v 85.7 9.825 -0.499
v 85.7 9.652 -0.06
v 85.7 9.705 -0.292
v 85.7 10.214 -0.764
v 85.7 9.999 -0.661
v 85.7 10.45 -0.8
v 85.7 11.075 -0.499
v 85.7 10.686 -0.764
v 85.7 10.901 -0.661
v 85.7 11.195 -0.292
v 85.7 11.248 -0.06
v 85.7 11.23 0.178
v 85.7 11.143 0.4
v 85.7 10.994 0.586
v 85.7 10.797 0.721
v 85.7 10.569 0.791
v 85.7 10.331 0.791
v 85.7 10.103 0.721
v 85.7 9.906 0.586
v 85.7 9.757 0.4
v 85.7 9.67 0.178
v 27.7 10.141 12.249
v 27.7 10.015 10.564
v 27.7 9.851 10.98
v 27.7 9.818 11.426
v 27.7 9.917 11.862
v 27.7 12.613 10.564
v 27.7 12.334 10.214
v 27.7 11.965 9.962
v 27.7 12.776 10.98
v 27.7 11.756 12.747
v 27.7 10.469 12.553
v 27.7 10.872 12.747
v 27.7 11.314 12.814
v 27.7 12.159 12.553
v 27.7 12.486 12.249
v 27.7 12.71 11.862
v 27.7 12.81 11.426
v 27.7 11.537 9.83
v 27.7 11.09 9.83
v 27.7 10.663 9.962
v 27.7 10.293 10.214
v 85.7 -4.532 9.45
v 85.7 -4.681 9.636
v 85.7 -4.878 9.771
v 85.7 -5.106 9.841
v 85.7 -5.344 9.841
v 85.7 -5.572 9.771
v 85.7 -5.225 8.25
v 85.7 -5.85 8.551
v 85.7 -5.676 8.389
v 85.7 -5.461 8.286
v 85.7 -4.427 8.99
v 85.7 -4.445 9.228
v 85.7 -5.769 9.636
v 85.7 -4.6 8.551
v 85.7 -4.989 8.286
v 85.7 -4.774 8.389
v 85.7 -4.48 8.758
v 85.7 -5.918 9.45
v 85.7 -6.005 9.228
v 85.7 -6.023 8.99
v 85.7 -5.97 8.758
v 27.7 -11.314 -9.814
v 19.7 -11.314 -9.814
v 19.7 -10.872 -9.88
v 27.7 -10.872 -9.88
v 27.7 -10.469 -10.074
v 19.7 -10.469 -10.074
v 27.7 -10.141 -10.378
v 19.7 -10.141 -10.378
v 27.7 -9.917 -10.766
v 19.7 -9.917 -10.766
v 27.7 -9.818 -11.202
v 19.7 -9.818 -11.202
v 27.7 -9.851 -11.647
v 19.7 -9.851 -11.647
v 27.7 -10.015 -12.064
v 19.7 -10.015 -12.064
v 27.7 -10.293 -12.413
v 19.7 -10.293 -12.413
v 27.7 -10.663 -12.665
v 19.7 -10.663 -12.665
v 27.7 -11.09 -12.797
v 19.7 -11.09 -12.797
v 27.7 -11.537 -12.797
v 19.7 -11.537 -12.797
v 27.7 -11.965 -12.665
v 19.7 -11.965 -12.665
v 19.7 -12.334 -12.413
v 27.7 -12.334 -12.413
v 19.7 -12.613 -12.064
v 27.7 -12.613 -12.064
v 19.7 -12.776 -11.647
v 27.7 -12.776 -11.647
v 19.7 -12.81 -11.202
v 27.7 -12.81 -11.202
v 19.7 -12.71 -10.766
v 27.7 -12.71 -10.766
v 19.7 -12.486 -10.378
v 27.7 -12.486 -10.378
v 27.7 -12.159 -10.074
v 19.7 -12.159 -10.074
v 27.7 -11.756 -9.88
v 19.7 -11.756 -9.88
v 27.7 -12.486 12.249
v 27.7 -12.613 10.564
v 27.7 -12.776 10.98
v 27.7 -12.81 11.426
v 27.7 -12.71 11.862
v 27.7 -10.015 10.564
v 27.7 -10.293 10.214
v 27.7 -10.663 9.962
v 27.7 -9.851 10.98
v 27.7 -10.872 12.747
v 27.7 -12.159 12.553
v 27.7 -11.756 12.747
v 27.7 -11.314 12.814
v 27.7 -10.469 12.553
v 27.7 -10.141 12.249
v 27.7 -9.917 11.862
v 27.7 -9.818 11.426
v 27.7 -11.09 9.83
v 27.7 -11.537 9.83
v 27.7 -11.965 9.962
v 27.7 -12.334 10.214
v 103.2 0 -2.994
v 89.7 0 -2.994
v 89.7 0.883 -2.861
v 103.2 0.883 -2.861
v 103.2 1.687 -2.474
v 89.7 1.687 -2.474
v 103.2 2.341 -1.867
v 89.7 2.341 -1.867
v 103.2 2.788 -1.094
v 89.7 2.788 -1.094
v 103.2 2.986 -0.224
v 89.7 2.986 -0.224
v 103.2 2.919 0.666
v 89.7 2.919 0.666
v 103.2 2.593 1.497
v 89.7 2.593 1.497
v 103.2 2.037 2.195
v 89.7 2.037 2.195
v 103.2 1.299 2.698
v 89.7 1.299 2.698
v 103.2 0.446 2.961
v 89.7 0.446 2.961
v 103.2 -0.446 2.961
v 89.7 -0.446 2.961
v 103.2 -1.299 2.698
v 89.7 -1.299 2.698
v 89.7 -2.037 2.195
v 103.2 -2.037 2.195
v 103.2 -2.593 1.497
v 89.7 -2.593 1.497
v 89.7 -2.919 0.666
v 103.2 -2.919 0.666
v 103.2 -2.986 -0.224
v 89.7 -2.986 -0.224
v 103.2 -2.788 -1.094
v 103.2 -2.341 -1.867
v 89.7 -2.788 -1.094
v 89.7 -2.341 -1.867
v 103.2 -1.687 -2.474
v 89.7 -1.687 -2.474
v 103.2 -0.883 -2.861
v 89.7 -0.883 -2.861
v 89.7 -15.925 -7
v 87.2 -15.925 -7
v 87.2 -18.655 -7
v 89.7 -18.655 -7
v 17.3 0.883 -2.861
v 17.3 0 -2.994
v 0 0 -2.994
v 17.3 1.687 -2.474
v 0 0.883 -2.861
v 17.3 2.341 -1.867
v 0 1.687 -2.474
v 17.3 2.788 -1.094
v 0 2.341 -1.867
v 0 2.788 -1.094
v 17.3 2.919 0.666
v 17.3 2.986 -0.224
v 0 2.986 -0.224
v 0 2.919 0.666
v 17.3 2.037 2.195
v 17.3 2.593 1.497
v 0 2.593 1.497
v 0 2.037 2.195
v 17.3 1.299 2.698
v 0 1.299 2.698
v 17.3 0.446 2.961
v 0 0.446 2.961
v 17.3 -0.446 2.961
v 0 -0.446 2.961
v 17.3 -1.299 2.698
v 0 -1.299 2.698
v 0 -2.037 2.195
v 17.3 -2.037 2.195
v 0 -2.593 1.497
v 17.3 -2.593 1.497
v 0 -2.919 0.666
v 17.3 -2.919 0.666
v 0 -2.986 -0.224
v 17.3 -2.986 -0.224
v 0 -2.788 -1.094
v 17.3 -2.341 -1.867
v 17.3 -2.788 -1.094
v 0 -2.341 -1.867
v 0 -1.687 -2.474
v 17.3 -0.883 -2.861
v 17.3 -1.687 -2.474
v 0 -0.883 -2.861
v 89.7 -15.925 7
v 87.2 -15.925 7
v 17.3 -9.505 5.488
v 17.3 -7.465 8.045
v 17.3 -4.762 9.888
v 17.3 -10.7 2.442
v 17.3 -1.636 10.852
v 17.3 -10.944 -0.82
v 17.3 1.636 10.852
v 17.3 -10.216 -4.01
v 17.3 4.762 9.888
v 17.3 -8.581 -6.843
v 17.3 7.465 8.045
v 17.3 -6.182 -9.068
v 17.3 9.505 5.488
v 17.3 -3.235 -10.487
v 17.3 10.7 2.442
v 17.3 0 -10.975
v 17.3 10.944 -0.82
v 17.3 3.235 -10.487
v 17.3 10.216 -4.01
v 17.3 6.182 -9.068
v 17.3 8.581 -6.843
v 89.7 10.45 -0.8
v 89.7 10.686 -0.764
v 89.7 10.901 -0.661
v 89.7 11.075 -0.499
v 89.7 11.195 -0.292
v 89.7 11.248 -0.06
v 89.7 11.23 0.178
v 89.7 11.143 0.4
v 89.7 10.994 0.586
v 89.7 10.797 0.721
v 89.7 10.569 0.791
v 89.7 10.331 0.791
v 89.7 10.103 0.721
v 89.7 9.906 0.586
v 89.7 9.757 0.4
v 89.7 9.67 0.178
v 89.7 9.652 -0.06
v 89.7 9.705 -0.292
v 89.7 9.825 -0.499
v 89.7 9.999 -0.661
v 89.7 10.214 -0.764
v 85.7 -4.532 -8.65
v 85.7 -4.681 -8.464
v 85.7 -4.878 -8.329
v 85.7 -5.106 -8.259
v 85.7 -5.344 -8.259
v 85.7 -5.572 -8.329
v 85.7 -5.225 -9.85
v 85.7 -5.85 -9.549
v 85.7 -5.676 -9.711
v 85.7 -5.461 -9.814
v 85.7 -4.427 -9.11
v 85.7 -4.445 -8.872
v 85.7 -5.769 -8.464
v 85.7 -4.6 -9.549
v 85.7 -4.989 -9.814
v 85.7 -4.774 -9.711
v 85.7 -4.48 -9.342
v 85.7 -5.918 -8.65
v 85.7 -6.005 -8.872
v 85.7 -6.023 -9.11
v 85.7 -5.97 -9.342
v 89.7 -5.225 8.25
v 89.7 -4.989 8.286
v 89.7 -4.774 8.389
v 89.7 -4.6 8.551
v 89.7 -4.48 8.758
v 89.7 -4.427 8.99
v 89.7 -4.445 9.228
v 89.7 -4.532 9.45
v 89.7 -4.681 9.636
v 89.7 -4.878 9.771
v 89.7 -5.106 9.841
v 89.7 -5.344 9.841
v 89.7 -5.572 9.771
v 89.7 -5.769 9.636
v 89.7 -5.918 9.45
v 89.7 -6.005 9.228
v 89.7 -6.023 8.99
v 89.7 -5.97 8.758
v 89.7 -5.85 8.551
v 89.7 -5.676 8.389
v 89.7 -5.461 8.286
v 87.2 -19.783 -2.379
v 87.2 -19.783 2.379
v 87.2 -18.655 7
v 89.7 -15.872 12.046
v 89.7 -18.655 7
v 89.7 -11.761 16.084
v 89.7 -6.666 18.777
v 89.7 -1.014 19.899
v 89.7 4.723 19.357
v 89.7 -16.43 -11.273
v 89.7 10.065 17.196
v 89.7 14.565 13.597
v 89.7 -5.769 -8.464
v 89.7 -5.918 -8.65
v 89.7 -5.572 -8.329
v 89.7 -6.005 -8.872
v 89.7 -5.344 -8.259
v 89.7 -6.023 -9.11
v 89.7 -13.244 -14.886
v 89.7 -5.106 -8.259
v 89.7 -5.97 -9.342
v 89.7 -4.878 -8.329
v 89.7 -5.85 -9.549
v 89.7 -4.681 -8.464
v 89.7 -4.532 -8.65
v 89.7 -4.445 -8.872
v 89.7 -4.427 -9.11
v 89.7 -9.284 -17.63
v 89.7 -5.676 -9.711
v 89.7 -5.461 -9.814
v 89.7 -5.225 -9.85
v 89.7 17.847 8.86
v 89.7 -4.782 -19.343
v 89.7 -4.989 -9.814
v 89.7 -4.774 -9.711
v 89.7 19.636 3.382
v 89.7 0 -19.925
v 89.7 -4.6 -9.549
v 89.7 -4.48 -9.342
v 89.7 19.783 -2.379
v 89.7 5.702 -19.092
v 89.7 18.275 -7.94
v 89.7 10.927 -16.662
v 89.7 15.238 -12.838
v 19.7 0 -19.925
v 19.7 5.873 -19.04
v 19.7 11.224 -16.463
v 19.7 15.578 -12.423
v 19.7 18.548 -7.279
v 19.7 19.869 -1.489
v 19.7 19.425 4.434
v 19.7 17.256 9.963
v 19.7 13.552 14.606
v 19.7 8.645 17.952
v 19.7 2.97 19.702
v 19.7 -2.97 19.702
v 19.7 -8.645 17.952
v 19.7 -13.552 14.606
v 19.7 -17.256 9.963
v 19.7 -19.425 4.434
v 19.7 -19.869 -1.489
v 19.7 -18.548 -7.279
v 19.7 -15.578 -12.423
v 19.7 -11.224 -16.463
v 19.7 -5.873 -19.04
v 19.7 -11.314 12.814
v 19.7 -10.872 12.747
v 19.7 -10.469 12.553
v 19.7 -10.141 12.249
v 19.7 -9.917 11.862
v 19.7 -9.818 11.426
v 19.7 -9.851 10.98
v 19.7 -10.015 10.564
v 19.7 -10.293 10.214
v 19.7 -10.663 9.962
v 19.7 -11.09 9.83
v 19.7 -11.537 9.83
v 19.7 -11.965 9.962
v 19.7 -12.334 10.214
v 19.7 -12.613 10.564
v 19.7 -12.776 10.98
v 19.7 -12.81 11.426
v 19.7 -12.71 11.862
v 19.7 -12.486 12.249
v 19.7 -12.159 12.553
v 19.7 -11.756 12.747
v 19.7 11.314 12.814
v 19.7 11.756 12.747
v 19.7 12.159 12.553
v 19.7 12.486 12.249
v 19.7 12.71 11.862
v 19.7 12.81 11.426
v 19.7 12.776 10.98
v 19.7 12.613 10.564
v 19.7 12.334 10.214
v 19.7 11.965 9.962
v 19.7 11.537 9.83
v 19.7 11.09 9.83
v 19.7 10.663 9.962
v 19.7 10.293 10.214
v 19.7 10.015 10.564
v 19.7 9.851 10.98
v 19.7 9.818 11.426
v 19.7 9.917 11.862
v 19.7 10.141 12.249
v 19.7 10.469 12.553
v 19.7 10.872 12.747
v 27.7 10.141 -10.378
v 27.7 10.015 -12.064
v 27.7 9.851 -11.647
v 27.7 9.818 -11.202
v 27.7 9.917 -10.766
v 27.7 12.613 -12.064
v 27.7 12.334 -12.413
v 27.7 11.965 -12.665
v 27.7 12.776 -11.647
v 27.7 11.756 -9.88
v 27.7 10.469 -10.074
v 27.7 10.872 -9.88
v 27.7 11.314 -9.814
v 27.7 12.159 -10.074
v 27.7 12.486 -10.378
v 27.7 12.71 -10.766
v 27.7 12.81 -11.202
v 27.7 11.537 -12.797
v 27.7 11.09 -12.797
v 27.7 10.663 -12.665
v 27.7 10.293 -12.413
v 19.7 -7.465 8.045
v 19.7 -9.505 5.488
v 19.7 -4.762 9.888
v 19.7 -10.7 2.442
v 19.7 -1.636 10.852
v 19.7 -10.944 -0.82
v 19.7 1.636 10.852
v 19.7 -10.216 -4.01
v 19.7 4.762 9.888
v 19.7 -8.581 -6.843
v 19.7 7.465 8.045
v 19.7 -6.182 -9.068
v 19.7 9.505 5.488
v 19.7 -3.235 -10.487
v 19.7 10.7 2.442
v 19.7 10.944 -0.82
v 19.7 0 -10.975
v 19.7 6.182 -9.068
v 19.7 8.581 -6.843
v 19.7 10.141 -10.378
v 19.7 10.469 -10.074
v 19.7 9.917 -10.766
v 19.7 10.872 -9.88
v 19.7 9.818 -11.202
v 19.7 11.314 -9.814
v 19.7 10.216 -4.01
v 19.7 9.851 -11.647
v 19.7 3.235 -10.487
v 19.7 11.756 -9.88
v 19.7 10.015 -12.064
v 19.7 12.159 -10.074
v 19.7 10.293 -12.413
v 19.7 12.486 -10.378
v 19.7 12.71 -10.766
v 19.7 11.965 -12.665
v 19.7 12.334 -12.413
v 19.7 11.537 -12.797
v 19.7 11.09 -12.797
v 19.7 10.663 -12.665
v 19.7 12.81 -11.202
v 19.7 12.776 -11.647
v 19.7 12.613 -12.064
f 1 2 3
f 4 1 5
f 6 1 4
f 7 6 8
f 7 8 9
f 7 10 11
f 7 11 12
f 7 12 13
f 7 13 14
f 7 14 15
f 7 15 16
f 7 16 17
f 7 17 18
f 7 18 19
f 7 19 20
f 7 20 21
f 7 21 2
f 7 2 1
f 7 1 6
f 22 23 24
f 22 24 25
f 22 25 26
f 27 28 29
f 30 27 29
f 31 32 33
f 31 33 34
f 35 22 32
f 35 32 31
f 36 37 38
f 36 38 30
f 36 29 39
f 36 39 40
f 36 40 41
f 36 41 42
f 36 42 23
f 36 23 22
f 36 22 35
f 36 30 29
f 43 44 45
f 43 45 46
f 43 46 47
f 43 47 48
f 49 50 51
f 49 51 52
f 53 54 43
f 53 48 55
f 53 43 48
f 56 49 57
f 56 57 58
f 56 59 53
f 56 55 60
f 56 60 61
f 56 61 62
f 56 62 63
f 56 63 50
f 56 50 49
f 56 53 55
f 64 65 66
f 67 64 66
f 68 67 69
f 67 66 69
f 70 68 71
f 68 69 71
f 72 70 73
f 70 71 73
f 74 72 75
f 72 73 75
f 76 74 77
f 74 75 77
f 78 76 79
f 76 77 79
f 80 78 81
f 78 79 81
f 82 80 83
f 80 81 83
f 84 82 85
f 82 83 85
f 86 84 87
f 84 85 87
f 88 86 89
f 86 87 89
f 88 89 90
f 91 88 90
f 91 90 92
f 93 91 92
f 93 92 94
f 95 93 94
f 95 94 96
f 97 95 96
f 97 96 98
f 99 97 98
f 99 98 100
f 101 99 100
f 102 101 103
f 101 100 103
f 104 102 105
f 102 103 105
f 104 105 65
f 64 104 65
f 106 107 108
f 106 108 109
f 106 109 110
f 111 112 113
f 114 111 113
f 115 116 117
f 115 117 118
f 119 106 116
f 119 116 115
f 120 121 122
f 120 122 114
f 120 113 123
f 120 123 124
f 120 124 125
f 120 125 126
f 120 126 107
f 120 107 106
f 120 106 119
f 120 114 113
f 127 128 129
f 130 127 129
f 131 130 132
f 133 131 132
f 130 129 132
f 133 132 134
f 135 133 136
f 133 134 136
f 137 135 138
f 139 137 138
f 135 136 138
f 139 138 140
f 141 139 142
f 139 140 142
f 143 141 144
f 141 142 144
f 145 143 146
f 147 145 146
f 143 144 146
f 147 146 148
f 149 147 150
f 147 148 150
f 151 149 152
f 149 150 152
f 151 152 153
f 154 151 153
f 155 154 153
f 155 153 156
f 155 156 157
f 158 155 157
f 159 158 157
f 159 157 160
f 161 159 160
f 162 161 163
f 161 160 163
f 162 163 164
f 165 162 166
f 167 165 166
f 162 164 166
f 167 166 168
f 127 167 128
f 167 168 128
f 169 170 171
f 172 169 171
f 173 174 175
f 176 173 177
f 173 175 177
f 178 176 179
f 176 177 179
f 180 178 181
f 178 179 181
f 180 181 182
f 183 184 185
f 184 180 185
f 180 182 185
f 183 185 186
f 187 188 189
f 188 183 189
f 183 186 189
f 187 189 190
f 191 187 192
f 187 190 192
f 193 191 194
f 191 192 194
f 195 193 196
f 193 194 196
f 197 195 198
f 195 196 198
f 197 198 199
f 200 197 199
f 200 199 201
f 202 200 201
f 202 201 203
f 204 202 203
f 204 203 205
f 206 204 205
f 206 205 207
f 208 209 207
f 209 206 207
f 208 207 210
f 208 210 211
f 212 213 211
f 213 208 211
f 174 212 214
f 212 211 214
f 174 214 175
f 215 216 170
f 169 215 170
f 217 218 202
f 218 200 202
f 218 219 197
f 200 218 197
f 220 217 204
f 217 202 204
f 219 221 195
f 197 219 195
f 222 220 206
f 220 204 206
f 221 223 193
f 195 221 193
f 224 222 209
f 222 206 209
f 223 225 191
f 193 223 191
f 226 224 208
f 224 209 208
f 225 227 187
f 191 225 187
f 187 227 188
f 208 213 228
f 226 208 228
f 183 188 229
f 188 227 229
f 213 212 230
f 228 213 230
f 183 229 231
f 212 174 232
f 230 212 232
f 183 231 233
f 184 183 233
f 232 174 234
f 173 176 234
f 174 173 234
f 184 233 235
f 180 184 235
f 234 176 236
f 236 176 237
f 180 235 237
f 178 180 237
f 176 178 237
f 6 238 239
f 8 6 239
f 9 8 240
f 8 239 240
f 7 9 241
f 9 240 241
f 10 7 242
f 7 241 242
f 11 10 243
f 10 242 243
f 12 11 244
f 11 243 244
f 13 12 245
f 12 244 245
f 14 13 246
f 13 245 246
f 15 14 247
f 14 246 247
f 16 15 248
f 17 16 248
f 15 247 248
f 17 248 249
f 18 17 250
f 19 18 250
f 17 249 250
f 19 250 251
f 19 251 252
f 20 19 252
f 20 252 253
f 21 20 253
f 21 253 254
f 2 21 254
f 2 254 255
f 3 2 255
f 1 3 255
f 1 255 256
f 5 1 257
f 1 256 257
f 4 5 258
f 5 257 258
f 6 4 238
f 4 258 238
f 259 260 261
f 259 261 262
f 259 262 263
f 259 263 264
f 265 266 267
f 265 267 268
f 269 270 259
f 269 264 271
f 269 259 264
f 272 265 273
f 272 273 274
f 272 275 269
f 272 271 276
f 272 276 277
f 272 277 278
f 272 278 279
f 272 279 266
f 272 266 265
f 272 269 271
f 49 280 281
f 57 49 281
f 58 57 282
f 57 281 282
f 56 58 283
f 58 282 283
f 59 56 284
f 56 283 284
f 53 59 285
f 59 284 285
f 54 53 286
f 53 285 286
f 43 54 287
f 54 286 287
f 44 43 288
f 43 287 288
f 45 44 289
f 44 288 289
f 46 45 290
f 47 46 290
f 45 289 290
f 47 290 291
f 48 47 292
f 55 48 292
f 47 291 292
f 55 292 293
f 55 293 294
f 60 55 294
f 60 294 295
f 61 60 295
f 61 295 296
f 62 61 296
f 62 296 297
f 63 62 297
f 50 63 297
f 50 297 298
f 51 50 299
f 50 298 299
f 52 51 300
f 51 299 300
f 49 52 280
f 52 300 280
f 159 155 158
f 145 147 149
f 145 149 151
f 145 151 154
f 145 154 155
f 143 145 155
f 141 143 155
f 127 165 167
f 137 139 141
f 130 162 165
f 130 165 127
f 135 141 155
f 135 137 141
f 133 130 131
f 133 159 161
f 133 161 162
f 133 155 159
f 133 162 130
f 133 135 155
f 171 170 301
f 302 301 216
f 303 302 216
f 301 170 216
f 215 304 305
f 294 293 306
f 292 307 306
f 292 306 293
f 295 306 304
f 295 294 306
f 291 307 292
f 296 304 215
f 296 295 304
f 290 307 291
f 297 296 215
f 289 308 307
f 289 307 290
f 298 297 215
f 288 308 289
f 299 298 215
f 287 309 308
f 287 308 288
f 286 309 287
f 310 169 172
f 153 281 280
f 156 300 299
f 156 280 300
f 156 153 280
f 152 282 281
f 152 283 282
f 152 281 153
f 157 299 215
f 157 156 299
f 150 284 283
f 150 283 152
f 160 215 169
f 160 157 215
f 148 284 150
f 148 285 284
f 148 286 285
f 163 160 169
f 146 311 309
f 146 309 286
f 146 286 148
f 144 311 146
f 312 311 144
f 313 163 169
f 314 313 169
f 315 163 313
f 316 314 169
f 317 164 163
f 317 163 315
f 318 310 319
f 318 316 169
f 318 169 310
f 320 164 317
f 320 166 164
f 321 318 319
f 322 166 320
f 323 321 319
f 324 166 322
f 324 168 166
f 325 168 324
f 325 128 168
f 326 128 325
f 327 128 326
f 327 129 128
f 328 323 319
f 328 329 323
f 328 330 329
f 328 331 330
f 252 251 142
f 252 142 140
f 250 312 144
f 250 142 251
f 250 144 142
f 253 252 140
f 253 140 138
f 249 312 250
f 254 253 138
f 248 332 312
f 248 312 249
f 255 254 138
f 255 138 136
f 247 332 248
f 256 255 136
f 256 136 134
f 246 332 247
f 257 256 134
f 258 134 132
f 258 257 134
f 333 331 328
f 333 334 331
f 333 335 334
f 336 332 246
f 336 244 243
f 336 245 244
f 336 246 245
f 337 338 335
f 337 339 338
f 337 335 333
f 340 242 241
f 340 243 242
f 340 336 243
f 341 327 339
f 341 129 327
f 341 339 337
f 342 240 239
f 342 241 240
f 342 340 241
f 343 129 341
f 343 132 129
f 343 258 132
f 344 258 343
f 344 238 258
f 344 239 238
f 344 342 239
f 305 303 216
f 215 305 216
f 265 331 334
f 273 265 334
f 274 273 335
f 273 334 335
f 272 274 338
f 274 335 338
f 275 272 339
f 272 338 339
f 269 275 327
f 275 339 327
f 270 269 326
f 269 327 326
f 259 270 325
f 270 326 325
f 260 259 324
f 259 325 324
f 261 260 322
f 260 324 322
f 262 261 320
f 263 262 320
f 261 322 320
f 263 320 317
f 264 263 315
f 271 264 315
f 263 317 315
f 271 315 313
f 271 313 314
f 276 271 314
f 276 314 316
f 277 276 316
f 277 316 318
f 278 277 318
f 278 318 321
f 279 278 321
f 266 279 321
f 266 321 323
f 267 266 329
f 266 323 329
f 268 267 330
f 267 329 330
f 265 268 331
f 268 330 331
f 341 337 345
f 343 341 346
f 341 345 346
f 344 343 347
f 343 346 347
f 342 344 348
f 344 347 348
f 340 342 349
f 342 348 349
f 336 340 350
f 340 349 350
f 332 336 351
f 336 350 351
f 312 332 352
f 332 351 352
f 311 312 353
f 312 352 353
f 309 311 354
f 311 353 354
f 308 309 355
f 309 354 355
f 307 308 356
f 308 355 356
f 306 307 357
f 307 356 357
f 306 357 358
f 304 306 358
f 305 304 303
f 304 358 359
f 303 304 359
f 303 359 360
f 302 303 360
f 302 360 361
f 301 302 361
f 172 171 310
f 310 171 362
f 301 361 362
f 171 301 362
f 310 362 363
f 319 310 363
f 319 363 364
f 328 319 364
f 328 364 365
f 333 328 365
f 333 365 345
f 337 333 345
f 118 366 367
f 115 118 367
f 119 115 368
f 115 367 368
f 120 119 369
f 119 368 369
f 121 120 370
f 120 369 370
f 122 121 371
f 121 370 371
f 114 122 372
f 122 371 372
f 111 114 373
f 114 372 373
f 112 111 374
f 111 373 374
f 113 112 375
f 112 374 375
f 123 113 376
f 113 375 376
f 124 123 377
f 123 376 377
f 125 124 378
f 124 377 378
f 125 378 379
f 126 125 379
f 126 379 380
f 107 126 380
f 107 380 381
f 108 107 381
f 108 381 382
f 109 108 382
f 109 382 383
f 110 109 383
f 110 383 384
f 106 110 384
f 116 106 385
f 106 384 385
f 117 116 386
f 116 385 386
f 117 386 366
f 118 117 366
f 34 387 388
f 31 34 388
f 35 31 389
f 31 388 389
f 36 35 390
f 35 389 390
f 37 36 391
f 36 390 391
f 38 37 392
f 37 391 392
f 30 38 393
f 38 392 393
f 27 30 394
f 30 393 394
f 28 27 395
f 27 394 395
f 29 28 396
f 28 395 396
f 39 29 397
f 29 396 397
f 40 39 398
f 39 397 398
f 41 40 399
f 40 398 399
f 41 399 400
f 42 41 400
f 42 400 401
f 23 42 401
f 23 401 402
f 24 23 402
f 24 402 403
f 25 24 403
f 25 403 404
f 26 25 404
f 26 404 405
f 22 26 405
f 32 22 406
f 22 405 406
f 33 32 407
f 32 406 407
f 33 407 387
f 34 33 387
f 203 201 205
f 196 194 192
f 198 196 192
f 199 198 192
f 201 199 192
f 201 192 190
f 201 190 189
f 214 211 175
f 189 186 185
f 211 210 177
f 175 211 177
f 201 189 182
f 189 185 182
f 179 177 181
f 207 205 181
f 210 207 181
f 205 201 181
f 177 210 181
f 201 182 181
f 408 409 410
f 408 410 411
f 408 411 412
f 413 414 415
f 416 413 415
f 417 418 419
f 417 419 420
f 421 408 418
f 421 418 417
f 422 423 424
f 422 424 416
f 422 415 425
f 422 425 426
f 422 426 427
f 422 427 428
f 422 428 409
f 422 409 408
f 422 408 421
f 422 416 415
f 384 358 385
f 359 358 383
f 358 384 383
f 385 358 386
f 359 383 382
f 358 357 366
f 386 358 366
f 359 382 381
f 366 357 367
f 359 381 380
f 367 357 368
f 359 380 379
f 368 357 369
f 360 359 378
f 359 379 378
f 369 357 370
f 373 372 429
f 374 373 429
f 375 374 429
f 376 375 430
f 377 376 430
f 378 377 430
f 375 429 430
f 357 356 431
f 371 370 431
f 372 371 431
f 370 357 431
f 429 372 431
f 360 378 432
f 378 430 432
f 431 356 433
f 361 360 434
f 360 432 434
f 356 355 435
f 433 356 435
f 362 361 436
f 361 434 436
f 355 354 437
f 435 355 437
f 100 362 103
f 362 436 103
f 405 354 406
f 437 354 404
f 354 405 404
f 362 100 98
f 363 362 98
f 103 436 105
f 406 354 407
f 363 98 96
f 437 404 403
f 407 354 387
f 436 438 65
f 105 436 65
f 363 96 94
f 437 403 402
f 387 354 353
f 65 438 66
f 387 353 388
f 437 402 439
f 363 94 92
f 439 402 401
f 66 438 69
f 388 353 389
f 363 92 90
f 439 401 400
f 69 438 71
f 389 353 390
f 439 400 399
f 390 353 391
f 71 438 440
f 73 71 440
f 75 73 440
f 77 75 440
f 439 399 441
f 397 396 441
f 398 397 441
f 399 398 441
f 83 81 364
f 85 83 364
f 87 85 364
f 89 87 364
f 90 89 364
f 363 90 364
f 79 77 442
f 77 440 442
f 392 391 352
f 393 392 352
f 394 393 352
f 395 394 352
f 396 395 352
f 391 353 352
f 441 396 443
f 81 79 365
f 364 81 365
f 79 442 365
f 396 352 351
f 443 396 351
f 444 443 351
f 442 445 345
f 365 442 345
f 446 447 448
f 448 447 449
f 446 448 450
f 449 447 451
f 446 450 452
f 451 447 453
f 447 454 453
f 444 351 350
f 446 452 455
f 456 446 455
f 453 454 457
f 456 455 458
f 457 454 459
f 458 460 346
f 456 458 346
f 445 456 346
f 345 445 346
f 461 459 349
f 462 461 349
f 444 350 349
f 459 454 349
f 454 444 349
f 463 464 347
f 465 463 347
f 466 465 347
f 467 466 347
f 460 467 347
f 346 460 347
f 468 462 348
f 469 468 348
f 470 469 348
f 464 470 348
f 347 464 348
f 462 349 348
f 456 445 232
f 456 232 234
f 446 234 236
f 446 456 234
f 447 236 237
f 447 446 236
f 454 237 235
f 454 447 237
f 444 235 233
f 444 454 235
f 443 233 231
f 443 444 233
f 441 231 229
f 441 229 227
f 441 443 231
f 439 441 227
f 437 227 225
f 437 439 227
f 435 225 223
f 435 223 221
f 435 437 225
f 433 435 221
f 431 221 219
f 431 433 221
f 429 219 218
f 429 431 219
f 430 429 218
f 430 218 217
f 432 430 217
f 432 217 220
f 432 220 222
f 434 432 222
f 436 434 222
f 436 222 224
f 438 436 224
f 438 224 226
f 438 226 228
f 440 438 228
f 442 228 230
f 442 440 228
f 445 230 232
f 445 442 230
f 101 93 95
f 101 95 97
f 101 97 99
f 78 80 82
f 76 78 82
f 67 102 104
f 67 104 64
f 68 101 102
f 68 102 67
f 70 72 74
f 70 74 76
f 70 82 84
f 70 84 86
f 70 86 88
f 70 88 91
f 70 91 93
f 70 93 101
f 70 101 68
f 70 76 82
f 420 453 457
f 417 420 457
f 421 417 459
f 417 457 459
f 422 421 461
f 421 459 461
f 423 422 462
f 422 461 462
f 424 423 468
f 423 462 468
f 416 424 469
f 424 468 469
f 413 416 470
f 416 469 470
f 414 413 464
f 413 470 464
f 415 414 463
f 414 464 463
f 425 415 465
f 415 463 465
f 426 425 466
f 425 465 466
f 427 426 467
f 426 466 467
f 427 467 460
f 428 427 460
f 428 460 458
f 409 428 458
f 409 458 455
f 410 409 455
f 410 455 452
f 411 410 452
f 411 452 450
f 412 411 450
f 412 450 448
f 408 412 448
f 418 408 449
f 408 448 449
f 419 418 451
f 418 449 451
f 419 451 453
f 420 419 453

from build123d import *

# Parameters (mm, degrees)
SKETCH1_R          = 2.9945
EXTRUDE1_DEPTH     = 19.7
SKETCH2_R          = 10.975
EXTRUDE2_DEPTH     = 2.4
SKETCH3_R          = 19.925
EXTRUDE3_DEPTH     = 70
SKETCH4_R          = 2.9945
EXTRUDE4_DEPTH     = 13.5
SKETCH5_R          = 1.5
CUT_EXTRUDE1_DEPTH = 8
SKETCH6_R          = 0.8
CUT_EXTRUDE2_DEPTH = 4
CUT_EXTRUDE3_START = -2.5
CUT_EXTRUDE3_DEPTH = 2.5


with BuildPart() as part:
    # Sketch1 → Extrude1 (new body)
    with BuildSketch(Plane(origin=(0, 0, 0), x_dir=(0, 0, -1), z_dir=(1, 0, 0))):
        Circle(SKETCH1_R)
    extrude(amount=EXTRUDE1_DEPTH)

    # Sketch2 → Extrude2 (add)
    with BuildSketch(Plane(origin=(19.7, 0, 0), x_dir=(0, 0, -1), z_dir=(1, 0, 0))):
        Circle(SKETCH2_R)
    extrude(amount=-EXTRUDE2_DEPTH)

    # Sketch3 → Extrude3 (add)
    with BuildSketch(Plane(origin=(19.7, 0, 0), x_dir=(0, 0, -1), z_dir=(1, 0, 0))):
        Circle(SKETCH3_R)
    extrude(amount=EXTRUDE3_DEPTH)

    # Sketch4 → Extrude4 (add)
    with BuildSketch(Plane(origin=(89.7, 0, 0), x_dir=(0, 0, -1), z_dir=(1, 0, 0))):
        Circle(SKETCH4_R)
    extrude(amount=EXTRUDE4_DEPTH)

    # Sketch5 → Cut-Extrude1 (cut)
    with BuildSketch(Plane.ZY.offset(-19.7)):
        with Locations((11.313708499, 11.313708499)):
            Circle(SKETCH5_R)
        with Locations((11.313708499, -11.313708499)):
            Circle(SKETCH5_R)
        with Locations((-11.313708499, -11.313708499)):
            Circle(SKETCH5_R)
        with Locations((-11.313708499, 11.313708499)):
            Circle(SKETCH5_R)
    extrude(amount=-CUT_EXTRUDE1_DEPTH, mode=Mode.SUBTRACT)

    # Sketch6 → Cut-Extrude2 (cut)
    with BuildSketch(Plane(origin=(89.7, 0, 0), x_dir=(0, 0, -1), z_dir=(1, 0, 0))):
        with Locations((0, 10.45)):
            Circle(SKETCH6_R)
        with Locations((9.04996547, -5.225)):
            Circle(SKETCH6_R)
        with Locations((-9.04996547, -5.225)):
            Circle(SKETCH6_R)
    extrude(amount=-CUT_EXTRUDE2_DEPTH, mode=Mode.SUBTRACT)

    # Sketch7 → Cut-Extrude3 (cut)
    with BuildSketch(Plane(origin=(89.7, 0, 0), x_dir=(0, 0, -1), z_dir=(1, 0, 0)).offset(CUT_EXTRUDE3_START)):
        with BuildLine():
            Line((-7, -15.925), (7, -15.925))
            Line((7, -15.925), (7, -18.654908871))
            ThreePointArc((7, -18.654908871), (0, -19.925), (-7, -18.654908871))
            Line((-7, -18.654908871), (-7, -15.925))
        make_face()
    extrude(amount=CUT_EXTRUDE3_DEPTH, mode=Mode.SUBTRACT)


solid = part.part
